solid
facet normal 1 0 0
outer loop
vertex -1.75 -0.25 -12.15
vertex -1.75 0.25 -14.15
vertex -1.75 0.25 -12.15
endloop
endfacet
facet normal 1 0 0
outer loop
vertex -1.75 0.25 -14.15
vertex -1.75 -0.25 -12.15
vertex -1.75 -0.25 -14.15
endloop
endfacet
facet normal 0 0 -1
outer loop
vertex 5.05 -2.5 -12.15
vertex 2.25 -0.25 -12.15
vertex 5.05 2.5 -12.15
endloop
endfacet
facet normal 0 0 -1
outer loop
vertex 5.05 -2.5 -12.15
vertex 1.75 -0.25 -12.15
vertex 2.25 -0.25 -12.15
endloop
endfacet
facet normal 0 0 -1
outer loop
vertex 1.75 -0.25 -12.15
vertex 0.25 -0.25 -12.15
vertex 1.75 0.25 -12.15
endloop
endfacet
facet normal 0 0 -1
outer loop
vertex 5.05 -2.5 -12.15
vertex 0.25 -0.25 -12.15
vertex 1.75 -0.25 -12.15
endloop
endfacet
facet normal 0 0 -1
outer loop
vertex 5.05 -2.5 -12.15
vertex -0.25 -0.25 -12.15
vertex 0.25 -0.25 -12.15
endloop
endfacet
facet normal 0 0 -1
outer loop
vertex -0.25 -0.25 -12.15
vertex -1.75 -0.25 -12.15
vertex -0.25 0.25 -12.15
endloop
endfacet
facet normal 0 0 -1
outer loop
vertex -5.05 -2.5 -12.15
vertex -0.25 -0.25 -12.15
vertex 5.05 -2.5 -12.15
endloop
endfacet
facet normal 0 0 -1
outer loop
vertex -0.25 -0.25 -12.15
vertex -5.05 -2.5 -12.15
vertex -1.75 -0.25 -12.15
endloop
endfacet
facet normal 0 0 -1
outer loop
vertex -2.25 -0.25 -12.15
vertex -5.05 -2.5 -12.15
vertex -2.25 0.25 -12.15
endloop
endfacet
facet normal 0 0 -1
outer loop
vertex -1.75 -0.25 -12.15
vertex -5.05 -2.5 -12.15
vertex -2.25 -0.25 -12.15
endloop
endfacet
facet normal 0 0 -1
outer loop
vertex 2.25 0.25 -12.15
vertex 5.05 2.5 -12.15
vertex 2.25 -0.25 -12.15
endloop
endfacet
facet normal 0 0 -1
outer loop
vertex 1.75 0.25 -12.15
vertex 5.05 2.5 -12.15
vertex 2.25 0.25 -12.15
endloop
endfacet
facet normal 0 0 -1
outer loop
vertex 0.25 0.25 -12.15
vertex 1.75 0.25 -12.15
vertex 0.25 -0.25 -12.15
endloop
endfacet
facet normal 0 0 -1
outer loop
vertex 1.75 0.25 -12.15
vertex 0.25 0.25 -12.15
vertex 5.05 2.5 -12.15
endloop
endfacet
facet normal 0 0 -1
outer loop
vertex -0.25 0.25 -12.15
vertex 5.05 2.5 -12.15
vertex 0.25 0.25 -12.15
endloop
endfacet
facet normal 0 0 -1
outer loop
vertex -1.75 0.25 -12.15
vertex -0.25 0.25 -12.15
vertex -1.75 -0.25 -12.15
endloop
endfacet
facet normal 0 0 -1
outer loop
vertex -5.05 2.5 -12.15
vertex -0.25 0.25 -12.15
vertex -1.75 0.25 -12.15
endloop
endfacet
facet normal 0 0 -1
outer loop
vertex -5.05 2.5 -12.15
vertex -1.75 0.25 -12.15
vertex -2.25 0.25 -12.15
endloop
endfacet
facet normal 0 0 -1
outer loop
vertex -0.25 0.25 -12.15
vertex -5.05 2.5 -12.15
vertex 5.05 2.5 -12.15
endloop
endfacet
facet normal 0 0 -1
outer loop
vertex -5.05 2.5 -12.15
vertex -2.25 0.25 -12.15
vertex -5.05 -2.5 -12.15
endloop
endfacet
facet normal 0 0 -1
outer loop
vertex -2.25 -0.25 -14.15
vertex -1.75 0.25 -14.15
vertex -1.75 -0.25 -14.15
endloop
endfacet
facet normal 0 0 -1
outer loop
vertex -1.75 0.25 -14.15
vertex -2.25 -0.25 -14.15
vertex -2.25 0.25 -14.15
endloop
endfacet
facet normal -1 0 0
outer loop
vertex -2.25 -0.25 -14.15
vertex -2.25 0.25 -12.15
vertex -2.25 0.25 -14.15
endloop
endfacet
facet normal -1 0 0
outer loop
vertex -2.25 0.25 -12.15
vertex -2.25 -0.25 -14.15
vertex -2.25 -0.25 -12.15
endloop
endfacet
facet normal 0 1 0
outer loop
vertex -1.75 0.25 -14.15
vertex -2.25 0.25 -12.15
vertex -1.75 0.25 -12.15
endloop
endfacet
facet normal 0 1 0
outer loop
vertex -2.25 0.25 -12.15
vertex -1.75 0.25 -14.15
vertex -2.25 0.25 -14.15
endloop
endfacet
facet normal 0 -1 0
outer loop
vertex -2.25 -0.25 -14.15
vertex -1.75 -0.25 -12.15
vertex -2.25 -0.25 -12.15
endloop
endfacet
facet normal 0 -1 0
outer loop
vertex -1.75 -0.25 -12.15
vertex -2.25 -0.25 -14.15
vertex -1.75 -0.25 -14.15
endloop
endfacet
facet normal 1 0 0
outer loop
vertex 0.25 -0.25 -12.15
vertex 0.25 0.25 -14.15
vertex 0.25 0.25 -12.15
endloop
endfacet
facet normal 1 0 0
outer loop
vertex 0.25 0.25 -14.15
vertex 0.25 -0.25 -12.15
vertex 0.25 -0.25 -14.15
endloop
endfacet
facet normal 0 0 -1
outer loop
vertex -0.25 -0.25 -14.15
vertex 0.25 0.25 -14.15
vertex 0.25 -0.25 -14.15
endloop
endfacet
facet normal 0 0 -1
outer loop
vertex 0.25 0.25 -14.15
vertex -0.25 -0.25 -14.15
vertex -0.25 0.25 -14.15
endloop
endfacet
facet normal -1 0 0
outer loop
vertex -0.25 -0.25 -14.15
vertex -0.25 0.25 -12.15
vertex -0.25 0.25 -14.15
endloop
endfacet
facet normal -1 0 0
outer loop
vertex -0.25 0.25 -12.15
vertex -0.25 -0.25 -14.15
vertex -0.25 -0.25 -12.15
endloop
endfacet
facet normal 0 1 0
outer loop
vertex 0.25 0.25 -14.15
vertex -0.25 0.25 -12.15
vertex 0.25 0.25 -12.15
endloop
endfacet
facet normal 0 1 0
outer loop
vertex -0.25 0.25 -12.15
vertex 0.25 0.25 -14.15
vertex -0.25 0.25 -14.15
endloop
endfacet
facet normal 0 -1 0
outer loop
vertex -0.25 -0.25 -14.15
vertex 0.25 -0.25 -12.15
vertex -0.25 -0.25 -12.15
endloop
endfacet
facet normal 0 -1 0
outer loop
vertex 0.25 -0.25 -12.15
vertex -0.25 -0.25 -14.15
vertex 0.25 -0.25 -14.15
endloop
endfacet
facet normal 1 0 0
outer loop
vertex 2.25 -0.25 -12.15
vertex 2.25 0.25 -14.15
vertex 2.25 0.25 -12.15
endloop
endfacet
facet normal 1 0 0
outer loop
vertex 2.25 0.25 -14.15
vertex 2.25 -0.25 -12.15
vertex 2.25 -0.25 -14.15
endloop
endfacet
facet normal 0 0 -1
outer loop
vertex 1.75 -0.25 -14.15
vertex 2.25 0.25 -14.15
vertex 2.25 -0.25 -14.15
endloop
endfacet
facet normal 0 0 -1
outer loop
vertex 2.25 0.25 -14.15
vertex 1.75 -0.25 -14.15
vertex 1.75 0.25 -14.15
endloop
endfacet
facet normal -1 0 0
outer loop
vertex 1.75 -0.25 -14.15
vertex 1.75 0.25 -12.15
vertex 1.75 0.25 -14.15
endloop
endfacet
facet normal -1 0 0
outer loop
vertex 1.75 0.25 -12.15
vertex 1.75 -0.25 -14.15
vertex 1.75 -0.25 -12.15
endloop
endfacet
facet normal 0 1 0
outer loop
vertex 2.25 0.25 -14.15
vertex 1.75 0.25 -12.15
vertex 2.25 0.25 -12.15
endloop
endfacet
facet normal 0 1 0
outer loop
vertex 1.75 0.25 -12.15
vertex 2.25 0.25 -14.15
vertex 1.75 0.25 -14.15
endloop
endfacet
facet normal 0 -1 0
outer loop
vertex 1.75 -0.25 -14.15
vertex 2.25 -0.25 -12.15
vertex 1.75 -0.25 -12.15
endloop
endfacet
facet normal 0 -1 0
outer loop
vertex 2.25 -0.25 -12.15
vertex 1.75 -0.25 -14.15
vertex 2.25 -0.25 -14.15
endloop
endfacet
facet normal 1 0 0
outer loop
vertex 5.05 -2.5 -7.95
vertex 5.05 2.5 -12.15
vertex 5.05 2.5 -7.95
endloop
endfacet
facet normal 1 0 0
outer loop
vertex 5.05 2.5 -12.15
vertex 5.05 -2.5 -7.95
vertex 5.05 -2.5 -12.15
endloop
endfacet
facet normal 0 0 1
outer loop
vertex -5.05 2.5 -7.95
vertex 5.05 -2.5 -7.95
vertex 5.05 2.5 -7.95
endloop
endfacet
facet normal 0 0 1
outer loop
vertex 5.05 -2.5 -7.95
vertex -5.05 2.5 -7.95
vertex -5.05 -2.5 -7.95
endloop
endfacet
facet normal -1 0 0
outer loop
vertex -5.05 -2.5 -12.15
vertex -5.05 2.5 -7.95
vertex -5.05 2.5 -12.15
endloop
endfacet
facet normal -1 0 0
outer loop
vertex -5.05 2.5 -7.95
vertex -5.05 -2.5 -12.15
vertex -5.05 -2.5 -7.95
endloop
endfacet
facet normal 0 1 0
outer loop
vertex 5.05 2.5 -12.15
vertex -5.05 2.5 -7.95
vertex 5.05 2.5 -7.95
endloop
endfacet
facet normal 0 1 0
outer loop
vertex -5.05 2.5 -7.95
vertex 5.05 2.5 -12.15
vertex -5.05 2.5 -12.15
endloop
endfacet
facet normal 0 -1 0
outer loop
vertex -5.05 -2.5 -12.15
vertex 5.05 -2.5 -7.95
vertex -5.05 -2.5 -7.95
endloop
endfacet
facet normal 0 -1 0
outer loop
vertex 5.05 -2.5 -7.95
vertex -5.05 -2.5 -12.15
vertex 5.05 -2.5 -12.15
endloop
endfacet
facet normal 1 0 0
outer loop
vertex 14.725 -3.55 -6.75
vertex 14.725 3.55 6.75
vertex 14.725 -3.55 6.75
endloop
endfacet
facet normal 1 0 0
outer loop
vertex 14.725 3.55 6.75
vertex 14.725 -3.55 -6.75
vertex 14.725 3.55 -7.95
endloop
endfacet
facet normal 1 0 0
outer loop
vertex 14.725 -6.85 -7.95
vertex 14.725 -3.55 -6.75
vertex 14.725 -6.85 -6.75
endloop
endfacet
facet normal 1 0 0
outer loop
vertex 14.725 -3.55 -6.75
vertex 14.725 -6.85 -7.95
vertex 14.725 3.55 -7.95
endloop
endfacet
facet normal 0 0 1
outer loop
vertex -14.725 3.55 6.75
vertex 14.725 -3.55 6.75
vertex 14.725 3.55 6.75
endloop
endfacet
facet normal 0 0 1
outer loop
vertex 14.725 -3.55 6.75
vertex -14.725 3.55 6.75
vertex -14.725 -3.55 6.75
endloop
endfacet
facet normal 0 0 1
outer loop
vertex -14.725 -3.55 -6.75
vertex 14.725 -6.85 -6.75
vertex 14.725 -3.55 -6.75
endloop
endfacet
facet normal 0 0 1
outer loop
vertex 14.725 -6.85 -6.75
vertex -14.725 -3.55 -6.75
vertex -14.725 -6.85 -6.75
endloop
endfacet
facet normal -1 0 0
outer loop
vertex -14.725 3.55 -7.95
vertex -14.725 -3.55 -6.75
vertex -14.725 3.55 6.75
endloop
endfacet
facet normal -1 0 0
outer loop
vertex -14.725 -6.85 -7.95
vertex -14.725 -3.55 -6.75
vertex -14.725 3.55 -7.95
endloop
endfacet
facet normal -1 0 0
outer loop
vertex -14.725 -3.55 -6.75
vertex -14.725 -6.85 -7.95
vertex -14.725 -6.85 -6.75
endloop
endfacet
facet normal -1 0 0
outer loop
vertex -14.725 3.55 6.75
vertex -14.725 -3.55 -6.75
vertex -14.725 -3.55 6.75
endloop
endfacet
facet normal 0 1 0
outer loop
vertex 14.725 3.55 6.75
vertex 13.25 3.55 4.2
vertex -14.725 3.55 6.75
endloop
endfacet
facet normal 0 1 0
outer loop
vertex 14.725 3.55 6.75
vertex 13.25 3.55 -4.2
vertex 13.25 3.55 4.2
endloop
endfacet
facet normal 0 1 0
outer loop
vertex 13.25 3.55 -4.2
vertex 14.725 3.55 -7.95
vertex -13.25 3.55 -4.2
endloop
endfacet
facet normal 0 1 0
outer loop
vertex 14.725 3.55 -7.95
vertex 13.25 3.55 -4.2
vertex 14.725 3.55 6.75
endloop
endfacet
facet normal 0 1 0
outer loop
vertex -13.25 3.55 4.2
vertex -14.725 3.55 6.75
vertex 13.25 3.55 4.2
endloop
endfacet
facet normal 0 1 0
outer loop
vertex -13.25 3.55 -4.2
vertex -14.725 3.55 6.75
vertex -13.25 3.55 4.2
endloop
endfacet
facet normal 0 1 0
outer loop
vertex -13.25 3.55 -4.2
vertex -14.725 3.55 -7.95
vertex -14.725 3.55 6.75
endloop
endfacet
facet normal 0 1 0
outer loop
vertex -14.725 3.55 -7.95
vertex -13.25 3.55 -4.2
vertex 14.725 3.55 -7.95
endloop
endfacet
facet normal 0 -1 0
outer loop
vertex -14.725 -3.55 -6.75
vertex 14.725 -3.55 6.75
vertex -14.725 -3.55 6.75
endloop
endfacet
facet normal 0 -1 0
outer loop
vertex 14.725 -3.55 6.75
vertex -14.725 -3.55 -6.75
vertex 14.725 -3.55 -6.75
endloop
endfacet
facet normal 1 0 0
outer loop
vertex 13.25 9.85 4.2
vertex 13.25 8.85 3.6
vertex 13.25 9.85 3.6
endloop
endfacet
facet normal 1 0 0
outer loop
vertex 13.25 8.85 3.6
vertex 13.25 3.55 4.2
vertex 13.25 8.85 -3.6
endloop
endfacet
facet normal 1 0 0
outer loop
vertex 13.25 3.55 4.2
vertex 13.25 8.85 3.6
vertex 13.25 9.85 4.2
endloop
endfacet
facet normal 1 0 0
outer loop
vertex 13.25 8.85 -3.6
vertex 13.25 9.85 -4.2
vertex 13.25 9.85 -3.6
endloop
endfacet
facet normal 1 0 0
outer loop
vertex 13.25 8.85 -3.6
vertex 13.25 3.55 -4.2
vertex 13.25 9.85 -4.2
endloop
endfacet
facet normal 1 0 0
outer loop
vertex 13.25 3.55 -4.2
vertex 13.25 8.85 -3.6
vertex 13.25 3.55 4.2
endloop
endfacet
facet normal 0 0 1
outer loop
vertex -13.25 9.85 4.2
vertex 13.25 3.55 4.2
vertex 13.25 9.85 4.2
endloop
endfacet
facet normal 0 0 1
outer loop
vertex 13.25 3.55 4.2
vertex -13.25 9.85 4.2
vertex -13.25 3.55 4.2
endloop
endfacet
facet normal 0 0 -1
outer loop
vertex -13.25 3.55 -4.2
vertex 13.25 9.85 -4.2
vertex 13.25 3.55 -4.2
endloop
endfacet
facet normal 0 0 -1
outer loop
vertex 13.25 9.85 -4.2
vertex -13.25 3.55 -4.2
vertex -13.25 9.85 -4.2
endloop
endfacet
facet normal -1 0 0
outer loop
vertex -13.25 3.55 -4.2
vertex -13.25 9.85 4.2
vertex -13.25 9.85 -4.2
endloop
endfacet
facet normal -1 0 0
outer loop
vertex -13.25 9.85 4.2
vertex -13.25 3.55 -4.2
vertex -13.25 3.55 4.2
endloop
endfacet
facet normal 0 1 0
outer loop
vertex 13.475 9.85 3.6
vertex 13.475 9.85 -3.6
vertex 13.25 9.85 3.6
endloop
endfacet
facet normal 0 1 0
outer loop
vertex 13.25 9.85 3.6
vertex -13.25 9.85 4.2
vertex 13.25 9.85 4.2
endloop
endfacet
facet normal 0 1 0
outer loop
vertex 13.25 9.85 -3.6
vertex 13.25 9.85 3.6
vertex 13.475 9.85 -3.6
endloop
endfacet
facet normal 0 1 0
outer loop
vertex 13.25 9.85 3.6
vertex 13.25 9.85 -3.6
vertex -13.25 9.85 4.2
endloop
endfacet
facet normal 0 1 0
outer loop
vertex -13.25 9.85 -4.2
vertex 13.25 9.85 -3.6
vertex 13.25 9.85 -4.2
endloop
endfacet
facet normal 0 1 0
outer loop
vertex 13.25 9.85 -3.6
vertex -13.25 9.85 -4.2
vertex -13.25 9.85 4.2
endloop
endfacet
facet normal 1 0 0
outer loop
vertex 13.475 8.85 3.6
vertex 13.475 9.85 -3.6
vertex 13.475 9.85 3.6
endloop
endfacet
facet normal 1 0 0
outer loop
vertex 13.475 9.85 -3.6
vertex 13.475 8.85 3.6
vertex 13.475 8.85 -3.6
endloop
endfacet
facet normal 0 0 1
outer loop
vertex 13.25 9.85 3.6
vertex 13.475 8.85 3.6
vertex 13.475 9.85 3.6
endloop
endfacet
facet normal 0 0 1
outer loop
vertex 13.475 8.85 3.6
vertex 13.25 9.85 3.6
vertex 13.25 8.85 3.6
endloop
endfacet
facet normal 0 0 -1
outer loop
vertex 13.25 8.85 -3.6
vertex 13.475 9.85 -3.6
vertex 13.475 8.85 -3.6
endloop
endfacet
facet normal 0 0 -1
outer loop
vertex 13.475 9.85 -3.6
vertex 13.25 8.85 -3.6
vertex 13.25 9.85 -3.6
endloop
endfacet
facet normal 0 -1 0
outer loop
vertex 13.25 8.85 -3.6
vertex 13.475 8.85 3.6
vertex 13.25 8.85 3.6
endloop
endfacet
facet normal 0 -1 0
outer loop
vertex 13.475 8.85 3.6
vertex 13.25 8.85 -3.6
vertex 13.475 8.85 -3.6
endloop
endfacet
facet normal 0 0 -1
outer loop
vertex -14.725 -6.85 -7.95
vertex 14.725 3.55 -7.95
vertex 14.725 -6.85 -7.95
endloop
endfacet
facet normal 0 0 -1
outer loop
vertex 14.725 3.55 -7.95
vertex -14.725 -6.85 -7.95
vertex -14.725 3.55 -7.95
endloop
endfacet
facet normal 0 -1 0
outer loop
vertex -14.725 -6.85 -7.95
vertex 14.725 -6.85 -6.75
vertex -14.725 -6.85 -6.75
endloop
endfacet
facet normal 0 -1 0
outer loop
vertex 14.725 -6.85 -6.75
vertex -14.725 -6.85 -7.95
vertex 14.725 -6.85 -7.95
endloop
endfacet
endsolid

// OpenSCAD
/*
  Sharp GP2Y0D413K0F Distance Sensor
  Modeled based on Outline Dimensions (Datasheet Page 2)
  
  Coordinates:
  - Origin (0,0,0) is the center of the main body block.
  - +Z: Up (Connector is at the bottom)
  - +Y: Front (Lens side)
  - +X: Right
*/

$fn = 32;

// --- Dimensions (mm) ---
BODY_W = 29.45;
BODY_H = 13.5;
BODY_D = 7.1;

LENS_CASE_D = 6.3; // (6.3) from front surface
LENS_CASE_H = 8.4;
LENS_CASE_W = 26.5; // Estimated from front view

LENS_EMITTER_X = -BODY_W/2 + 4.5;  // *4.5 from left edge
LENS_DETECTOR_X = LENS_EMITTER_X + 19.7; // *19.7 center to center
LENS_H = 7.2; // From side view height of opening

PWB_T = 1.2;
PWB_D = 7.1 + 3.3; // Body depth + (3.3) reference for connector protrusion
PWB_OFFSET_Y = -3.3 / 2; // Shifted towards back

CONN_W = 10.1;
CONN_H = 18.9 - BODY_H - PWB_T; // Total height 18.9 minus body and PWB
CONN_D = 5.0; // Simplified depth

// --- Colors ---
COLOR_CASE      = [0.15, 0.15, 0.15]; // Carbonic ABS (Dark Grey/Black)
COLOR_LENS_WIN  = [0.2, 0.05, 0.1, 0.8]; // IR Filter (Dark Reddish Translucent)
COLOR_PWB       = [0.5, 0.4, 0.2];    // Paper Phenol (Brownish)
COLOR_CONN      = [0.9, 0.9, 0.8];    // White/Beige Connector

// --- Modeling ---

// 1. Main Body Case
color(COLOR_CASE)
cube([BODY_W, BODY_D, BODY_H], center=true);

// 2. Lens Case Protrusion
translate([0, BODY_D/2 + LENS_CASE_D/2, 0])
color(COLOR_CASE)
cube([LENS_CASE_W, LENS_CASE_D, LENS_CASE_H], center=true);

// 3. Emitter Lens (Round window, Left)
translate([LENS_EMITTER_X, BODY_D/2 + LENS_CASE_D - 0.5, 0])
rotate([90, 0, 0])
color(COLOR_LENS_WIN)
cylinder(h=1, d=6, center=true);

// 4. Detector Lens (Rectangular window, Right)
translate([LENS_DETECTOR_X, BODY_D/2 + LENS_CASE_D - 0.5, 0])
color(COLOR_LENS_WIN)
cube([8, 1, LENS_H], center=true);

// 5. PWB (Printed Wiring Board)
translate([0, PWB_OFFSET_Y, -BODY_H/2 - PWB_T/2])
color(COLOR_PWB)
cube([BODY_W, PWB_D, PWB_T], center=true);

// 6. 3-Pin Connector (JCTC 12001W90-3P-HF)
// Simplified as a block with 3 pins
translate([0, 0, -BODY_H/2 - PWB_T - CONN_H/2]) {
    color(COLOR_CONN)
    cube([CONN_W, CONN_D, CONN_H], center=true);
    
    // Tiny pins simplified
    for(i = [-1 : 1]) {
        translate([i * 2, 0, -CONN_H/2 - 1])
        color("silver")
        cube([0.5, 0.5, 2], center=true);
    }
}
